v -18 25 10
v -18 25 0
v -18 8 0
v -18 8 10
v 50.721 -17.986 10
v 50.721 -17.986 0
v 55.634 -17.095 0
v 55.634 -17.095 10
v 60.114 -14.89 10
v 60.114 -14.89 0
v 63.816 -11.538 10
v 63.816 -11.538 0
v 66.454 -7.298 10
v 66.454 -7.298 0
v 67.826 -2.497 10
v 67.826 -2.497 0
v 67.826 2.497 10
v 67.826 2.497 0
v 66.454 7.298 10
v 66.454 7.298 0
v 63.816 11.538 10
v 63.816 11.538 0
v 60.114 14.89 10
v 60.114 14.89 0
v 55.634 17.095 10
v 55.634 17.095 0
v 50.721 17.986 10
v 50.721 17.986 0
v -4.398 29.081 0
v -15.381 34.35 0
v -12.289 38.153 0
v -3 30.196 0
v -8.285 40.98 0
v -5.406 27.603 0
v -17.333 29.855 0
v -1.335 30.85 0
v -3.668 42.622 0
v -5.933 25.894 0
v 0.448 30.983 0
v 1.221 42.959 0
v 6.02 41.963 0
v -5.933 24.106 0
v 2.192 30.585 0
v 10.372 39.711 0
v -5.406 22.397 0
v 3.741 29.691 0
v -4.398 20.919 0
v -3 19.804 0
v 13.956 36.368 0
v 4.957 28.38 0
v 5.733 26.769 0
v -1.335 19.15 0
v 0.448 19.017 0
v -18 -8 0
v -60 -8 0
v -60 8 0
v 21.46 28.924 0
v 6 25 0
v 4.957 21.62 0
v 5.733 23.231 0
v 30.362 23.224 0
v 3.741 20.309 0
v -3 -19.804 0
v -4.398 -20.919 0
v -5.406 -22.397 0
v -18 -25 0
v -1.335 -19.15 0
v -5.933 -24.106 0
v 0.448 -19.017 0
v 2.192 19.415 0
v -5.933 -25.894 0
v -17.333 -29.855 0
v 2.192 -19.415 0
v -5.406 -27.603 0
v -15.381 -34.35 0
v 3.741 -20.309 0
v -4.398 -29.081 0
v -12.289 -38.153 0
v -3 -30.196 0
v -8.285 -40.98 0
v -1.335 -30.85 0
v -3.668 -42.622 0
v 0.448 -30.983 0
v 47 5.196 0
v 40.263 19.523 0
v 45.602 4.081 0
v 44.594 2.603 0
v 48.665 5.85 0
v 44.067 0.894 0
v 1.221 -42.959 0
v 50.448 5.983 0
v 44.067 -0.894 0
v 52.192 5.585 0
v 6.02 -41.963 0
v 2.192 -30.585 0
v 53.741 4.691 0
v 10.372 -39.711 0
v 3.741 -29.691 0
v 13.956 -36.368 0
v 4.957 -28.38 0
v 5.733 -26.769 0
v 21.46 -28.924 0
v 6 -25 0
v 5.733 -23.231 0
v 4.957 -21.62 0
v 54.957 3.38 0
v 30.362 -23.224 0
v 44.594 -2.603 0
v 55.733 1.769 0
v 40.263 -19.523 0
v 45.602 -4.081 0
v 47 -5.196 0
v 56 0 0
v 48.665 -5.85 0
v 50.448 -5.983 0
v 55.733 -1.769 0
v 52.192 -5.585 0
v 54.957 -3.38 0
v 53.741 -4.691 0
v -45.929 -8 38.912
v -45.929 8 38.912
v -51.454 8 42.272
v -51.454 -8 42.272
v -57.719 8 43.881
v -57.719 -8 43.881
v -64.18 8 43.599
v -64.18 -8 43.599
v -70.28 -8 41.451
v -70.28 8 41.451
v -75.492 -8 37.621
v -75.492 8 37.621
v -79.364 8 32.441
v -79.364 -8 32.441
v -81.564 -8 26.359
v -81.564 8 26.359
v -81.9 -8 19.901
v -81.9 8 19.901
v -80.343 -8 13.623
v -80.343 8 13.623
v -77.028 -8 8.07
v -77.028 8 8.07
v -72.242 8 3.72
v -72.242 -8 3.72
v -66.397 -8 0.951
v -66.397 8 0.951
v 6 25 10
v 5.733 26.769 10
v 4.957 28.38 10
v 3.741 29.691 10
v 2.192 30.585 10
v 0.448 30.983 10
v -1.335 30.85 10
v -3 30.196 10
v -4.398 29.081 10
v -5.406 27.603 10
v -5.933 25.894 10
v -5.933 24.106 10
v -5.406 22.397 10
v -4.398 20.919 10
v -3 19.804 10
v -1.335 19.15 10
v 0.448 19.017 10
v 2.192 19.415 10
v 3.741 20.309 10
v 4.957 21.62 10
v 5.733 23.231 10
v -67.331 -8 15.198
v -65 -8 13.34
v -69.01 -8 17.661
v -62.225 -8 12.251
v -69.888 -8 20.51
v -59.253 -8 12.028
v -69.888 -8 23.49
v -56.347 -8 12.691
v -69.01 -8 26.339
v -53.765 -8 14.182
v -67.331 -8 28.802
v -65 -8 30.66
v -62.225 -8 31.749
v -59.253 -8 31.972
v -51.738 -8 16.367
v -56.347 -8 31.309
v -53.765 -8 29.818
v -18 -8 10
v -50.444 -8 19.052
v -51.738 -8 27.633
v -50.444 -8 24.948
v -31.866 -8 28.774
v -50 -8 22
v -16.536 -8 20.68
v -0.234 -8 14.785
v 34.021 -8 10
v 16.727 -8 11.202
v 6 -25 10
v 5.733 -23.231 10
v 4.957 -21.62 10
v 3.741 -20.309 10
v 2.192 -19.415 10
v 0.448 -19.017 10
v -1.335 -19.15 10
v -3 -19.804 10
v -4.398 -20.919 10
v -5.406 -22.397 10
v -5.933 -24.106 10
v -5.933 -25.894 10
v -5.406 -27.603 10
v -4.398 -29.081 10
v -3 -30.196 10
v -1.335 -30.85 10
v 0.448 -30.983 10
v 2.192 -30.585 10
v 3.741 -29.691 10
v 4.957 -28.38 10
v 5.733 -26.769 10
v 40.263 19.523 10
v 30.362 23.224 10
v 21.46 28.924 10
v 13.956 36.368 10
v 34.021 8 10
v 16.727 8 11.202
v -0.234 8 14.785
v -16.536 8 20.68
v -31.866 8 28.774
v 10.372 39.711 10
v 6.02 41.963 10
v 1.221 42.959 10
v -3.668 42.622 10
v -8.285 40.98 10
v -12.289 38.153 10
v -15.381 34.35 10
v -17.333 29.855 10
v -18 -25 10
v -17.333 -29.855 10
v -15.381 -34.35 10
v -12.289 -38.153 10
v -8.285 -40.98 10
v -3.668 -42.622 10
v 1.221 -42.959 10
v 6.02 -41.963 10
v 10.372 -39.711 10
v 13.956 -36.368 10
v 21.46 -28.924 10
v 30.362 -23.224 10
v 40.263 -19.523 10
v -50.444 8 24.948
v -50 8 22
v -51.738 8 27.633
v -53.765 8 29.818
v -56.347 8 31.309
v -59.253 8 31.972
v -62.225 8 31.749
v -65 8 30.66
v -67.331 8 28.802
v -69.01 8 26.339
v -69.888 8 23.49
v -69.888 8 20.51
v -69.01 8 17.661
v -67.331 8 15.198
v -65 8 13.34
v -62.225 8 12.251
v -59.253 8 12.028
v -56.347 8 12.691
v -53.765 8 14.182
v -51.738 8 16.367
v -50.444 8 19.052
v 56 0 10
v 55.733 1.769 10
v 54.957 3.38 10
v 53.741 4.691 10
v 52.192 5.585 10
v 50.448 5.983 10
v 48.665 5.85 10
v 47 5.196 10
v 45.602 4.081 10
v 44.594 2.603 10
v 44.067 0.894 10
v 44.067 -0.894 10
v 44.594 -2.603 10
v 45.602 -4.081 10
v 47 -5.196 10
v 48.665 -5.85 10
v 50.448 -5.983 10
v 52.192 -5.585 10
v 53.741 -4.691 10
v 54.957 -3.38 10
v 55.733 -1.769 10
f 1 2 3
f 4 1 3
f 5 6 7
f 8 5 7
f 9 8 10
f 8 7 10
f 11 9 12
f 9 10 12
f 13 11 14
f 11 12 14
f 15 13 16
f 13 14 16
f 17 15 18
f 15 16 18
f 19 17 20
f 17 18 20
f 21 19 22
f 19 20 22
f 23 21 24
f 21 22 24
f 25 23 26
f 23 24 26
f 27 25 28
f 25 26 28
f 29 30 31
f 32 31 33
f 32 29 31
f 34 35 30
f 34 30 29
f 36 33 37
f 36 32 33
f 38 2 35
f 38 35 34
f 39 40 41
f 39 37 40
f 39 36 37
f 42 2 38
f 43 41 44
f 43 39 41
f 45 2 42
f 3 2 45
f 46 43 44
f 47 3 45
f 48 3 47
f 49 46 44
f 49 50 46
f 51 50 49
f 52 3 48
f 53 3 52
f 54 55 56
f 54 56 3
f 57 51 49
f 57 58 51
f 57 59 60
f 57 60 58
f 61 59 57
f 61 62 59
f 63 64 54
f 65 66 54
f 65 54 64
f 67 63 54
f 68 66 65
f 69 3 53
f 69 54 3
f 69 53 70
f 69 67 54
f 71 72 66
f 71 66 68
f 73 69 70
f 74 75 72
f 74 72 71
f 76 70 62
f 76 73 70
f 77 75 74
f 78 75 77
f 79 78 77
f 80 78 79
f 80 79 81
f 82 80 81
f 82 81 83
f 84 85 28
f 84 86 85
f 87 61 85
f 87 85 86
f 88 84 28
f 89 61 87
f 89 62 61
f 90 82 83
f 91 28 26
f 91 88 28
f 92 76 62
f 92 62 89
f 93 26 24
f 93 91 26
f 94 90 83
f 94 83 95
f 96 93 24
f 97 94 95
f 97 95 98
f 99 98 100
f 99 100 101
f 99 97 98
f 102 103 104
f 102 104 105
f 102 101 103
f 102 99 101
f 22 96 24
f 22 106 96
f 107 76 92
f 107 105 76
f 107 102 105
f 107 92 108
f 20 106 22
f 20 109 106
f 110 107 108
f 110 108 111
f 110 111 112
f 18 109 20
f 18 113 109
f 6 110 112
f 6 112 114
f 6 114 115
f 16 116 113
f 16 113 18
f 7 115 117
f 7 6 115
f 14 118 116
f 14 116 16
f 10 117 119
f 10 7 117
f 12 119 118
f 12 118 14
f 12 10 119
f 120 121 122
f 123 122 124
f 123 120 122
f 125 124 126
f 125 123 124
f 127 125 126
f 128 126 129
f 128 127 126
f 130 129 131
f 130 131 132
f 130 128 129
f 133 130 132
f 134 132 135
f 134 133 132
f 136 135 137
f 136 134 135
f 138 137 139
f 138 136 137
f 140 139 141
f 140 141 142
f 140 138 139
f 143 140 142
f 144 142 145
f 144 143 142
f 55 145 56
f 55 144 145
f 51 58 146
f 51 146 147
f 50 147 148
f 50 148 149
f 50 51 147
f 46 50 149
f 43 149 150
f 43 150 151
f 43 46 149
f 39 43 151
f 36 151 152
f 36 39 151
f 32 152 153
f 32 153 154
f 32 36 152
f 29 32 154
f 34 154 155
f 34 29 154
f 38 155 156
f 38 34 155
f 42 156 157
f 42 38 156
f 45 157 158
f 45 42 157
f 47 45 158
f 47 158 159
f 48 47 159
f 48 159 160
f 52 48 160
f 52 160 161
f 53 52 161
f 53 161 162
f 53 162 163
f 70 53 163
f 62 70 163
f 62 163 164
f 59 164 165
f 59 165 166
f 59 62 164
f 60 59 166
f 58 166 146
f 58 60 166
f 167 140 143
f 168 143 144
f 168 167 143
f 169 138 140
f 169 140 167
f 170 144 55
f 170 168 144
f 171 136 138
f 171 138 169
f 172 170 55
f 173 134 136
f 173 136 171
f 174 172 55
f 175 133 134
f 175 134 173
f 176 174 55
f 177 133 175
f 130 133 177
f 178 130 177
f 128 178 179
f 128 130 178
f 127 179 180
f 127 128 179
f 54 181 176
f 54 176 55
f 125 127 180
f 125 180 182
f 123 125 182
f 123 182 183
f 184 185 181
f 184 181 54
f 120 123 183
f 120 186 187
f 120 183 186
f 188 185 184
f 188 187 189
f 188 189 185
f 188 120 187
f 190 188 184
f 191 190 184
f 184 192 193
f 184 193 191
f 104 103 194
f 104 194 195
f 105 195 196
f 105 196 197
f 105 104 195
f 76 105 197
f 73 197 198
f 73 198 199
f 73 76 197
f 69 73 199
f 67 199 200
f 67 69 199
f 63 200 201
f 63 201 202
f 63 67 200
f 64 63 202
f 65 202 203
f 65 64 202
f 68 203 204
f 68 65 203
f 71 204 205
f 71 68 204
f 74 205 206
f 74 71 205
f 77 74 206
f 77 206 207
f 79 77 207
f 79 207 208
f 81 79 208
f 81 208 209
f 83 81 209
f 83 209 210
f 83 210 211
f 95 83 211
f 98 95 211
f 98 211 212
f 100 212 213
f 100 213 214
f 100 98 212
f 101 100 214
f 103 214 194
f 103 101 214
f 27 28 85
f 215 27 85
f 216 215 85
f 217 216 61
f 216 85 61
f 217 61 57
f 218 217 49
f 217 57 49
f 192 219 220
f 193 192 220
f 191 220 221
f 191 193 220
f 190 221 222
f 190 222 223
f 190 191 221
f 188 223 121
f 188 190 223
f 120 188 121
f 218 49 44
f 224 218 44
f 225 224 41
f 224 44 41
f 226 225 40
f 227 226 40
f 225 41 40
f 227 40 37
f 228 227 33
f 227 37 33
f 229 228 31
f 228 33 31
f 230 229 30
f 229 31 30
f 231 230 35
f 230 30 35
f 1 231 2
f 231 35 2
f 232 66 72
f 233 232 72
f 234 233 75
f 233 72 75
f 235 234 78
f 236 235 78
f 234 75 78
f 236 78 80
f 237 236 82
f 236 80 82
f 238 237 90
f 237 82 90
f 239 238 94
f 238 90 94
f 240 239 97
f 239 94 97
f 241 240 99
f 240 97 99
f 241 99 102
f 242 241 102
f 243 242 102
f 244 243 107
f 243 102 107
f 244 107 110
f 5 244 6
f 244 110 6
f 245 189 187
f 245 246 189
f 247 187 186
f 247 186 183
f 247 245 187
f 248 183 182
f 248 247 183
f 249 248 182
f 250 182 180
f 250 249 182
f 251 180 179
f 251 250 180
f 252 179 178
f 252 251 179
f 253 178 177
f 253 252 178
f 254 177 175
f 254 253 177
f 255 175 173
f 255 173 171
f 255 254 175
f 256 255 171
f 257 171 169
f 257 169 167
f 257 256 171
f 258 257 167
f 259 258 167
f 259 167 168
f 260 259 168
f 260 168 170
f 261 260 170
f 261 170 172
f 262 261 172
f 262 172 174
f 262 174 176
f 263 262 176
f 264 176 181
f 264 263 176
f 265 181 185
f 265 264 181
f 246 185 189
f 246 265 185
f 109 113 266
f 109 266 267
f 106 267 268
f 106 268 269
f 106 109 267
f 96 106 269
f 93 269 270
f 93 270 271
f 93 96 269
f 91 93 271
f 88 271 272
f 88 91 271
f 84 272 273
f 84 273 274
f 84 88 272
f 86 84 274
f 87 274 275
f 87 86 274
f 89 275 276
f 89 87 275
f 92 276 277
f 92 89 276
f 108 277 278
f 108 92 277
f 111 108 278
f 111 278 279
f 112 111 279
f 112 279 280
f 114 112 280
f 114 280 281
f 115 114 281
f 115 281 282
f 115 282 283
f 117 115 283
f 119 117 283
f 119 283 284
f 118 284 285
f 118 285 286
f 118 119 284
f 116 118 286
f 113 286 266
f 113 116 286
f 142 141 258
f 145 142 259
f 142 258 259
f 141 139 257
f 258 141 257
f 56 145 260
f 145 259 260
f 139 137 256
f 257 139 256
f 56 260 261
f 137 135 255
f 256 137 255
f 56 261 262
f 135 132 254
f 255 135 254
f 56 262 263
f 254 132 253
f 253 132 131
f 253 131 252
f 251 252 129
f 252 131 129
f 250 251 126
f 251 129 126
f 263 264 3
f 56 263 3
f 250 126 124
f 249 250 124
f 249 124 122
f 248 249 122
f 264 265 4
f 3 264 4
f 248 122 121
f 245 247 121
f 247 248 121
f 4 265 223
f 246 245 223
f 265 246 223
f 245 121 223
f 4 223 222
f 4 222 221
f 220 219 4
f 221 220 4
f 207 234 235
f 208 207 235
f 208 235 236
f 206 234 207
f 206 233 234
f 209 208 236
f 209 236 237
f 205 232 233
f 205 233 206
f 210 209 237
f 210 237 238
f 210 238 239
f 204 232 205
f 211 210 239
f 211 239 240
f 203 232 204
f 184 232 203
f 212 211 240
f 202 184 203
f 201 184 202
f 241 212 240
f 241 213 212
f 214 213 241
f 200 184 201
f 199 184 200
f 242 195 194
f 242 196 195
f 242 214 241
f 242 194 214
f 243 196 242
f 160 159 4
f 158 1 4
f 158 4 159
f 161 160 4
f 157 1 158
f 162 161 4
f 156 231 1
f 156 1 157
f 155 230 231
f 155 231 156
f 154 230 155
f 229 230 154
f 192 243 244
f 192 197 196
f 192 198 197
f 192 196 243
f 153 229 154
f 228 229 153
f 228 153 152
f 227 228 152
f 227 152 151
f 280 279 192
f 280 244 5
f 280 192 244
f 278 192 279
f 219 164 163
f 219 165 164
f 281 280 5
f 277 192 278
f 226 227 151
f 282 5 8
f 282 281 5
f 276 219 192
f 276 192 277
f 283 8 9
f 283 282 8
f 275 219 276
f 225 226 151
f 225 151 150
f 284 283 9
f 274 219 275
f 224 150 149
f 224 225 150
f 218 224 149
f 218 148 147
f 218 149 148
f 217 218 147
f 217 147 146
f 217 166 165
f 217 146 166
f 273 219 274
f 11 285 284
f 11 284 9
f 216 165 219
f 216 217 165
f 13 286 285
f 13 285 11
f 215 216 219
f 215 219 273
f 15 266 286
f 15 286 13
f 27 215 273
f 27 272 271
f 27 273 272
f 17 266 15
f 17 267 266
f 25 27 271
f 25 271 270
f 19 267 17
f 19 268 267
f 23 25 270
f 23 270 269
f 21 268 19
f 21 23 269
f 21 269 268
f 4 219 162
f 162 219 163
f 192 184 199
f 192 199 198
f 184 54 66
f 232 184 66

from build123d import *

# Parameters (mm, degrees)
F0_R     = 6
F1_DEPTH = 10
F2_R     = 10
F3_DEPTH = 8


with BuildPart() as f1:
    # F0 (on Top) → F1 (new body)
    with BuildSketch(Plane.XY):
        with BuildLine():
            ThreePointArc((50.720724, 17.985565), (30.362055, 23.224109), (13.956018, 36.367918))
            ThreePointArc((13.956018, 36.367918), (-6.032896, 41.958896), (-18, 25))
            Line((-18, 25), (-18, -25))
            ThreePointArc((-18, -25), (-6.032896, -41.958896), (13.956018, -36.367918))
            ThreePointArc((13.956018, -36.367918), (30.362055, -23.224109), (50.720724, -17.985565))
            ThreePointArc((50.720724, -17.985565), (68, 0), (50.720724, 17.985565))
        make_face()
        with Locations((0, -25)):
            Circle(F0_R, mode=Mode.SUBTRACT)
        with Locations((0, 25)):
            Circle(F0_R, mode=Mode.SUBTRACT)
        with Locations((50, 0)):
            Circle(F0_R, mode=Mode.SUBTRACT)
    extrude(amount=F1_DEPTH)

    # F2 (on Front) → F3 (join, symmetric)
    with BuildSketch(Plane.XZ):
        with BuildLine():
            ThreePointArc((34.021274, 10), (-8.487228, 17.449895), (-45.928789, 38.911565))
            ThreePointArc((-45.928789, 38.911565), (-80.688818, 29.481496), (-60, 0))
            Line((-60, 0), (0, 0))
            Line((0, 0), (34.021274, 0))
            Line((34.021274, 0), (34.021274, 10))
        make_face()
        with Locations((-60, 22)):
            Circle(F2_R, mode=Mode.SUBTRACT)
    extrude(amount=F3_DEPTH, both=True)


solid = f1.part
